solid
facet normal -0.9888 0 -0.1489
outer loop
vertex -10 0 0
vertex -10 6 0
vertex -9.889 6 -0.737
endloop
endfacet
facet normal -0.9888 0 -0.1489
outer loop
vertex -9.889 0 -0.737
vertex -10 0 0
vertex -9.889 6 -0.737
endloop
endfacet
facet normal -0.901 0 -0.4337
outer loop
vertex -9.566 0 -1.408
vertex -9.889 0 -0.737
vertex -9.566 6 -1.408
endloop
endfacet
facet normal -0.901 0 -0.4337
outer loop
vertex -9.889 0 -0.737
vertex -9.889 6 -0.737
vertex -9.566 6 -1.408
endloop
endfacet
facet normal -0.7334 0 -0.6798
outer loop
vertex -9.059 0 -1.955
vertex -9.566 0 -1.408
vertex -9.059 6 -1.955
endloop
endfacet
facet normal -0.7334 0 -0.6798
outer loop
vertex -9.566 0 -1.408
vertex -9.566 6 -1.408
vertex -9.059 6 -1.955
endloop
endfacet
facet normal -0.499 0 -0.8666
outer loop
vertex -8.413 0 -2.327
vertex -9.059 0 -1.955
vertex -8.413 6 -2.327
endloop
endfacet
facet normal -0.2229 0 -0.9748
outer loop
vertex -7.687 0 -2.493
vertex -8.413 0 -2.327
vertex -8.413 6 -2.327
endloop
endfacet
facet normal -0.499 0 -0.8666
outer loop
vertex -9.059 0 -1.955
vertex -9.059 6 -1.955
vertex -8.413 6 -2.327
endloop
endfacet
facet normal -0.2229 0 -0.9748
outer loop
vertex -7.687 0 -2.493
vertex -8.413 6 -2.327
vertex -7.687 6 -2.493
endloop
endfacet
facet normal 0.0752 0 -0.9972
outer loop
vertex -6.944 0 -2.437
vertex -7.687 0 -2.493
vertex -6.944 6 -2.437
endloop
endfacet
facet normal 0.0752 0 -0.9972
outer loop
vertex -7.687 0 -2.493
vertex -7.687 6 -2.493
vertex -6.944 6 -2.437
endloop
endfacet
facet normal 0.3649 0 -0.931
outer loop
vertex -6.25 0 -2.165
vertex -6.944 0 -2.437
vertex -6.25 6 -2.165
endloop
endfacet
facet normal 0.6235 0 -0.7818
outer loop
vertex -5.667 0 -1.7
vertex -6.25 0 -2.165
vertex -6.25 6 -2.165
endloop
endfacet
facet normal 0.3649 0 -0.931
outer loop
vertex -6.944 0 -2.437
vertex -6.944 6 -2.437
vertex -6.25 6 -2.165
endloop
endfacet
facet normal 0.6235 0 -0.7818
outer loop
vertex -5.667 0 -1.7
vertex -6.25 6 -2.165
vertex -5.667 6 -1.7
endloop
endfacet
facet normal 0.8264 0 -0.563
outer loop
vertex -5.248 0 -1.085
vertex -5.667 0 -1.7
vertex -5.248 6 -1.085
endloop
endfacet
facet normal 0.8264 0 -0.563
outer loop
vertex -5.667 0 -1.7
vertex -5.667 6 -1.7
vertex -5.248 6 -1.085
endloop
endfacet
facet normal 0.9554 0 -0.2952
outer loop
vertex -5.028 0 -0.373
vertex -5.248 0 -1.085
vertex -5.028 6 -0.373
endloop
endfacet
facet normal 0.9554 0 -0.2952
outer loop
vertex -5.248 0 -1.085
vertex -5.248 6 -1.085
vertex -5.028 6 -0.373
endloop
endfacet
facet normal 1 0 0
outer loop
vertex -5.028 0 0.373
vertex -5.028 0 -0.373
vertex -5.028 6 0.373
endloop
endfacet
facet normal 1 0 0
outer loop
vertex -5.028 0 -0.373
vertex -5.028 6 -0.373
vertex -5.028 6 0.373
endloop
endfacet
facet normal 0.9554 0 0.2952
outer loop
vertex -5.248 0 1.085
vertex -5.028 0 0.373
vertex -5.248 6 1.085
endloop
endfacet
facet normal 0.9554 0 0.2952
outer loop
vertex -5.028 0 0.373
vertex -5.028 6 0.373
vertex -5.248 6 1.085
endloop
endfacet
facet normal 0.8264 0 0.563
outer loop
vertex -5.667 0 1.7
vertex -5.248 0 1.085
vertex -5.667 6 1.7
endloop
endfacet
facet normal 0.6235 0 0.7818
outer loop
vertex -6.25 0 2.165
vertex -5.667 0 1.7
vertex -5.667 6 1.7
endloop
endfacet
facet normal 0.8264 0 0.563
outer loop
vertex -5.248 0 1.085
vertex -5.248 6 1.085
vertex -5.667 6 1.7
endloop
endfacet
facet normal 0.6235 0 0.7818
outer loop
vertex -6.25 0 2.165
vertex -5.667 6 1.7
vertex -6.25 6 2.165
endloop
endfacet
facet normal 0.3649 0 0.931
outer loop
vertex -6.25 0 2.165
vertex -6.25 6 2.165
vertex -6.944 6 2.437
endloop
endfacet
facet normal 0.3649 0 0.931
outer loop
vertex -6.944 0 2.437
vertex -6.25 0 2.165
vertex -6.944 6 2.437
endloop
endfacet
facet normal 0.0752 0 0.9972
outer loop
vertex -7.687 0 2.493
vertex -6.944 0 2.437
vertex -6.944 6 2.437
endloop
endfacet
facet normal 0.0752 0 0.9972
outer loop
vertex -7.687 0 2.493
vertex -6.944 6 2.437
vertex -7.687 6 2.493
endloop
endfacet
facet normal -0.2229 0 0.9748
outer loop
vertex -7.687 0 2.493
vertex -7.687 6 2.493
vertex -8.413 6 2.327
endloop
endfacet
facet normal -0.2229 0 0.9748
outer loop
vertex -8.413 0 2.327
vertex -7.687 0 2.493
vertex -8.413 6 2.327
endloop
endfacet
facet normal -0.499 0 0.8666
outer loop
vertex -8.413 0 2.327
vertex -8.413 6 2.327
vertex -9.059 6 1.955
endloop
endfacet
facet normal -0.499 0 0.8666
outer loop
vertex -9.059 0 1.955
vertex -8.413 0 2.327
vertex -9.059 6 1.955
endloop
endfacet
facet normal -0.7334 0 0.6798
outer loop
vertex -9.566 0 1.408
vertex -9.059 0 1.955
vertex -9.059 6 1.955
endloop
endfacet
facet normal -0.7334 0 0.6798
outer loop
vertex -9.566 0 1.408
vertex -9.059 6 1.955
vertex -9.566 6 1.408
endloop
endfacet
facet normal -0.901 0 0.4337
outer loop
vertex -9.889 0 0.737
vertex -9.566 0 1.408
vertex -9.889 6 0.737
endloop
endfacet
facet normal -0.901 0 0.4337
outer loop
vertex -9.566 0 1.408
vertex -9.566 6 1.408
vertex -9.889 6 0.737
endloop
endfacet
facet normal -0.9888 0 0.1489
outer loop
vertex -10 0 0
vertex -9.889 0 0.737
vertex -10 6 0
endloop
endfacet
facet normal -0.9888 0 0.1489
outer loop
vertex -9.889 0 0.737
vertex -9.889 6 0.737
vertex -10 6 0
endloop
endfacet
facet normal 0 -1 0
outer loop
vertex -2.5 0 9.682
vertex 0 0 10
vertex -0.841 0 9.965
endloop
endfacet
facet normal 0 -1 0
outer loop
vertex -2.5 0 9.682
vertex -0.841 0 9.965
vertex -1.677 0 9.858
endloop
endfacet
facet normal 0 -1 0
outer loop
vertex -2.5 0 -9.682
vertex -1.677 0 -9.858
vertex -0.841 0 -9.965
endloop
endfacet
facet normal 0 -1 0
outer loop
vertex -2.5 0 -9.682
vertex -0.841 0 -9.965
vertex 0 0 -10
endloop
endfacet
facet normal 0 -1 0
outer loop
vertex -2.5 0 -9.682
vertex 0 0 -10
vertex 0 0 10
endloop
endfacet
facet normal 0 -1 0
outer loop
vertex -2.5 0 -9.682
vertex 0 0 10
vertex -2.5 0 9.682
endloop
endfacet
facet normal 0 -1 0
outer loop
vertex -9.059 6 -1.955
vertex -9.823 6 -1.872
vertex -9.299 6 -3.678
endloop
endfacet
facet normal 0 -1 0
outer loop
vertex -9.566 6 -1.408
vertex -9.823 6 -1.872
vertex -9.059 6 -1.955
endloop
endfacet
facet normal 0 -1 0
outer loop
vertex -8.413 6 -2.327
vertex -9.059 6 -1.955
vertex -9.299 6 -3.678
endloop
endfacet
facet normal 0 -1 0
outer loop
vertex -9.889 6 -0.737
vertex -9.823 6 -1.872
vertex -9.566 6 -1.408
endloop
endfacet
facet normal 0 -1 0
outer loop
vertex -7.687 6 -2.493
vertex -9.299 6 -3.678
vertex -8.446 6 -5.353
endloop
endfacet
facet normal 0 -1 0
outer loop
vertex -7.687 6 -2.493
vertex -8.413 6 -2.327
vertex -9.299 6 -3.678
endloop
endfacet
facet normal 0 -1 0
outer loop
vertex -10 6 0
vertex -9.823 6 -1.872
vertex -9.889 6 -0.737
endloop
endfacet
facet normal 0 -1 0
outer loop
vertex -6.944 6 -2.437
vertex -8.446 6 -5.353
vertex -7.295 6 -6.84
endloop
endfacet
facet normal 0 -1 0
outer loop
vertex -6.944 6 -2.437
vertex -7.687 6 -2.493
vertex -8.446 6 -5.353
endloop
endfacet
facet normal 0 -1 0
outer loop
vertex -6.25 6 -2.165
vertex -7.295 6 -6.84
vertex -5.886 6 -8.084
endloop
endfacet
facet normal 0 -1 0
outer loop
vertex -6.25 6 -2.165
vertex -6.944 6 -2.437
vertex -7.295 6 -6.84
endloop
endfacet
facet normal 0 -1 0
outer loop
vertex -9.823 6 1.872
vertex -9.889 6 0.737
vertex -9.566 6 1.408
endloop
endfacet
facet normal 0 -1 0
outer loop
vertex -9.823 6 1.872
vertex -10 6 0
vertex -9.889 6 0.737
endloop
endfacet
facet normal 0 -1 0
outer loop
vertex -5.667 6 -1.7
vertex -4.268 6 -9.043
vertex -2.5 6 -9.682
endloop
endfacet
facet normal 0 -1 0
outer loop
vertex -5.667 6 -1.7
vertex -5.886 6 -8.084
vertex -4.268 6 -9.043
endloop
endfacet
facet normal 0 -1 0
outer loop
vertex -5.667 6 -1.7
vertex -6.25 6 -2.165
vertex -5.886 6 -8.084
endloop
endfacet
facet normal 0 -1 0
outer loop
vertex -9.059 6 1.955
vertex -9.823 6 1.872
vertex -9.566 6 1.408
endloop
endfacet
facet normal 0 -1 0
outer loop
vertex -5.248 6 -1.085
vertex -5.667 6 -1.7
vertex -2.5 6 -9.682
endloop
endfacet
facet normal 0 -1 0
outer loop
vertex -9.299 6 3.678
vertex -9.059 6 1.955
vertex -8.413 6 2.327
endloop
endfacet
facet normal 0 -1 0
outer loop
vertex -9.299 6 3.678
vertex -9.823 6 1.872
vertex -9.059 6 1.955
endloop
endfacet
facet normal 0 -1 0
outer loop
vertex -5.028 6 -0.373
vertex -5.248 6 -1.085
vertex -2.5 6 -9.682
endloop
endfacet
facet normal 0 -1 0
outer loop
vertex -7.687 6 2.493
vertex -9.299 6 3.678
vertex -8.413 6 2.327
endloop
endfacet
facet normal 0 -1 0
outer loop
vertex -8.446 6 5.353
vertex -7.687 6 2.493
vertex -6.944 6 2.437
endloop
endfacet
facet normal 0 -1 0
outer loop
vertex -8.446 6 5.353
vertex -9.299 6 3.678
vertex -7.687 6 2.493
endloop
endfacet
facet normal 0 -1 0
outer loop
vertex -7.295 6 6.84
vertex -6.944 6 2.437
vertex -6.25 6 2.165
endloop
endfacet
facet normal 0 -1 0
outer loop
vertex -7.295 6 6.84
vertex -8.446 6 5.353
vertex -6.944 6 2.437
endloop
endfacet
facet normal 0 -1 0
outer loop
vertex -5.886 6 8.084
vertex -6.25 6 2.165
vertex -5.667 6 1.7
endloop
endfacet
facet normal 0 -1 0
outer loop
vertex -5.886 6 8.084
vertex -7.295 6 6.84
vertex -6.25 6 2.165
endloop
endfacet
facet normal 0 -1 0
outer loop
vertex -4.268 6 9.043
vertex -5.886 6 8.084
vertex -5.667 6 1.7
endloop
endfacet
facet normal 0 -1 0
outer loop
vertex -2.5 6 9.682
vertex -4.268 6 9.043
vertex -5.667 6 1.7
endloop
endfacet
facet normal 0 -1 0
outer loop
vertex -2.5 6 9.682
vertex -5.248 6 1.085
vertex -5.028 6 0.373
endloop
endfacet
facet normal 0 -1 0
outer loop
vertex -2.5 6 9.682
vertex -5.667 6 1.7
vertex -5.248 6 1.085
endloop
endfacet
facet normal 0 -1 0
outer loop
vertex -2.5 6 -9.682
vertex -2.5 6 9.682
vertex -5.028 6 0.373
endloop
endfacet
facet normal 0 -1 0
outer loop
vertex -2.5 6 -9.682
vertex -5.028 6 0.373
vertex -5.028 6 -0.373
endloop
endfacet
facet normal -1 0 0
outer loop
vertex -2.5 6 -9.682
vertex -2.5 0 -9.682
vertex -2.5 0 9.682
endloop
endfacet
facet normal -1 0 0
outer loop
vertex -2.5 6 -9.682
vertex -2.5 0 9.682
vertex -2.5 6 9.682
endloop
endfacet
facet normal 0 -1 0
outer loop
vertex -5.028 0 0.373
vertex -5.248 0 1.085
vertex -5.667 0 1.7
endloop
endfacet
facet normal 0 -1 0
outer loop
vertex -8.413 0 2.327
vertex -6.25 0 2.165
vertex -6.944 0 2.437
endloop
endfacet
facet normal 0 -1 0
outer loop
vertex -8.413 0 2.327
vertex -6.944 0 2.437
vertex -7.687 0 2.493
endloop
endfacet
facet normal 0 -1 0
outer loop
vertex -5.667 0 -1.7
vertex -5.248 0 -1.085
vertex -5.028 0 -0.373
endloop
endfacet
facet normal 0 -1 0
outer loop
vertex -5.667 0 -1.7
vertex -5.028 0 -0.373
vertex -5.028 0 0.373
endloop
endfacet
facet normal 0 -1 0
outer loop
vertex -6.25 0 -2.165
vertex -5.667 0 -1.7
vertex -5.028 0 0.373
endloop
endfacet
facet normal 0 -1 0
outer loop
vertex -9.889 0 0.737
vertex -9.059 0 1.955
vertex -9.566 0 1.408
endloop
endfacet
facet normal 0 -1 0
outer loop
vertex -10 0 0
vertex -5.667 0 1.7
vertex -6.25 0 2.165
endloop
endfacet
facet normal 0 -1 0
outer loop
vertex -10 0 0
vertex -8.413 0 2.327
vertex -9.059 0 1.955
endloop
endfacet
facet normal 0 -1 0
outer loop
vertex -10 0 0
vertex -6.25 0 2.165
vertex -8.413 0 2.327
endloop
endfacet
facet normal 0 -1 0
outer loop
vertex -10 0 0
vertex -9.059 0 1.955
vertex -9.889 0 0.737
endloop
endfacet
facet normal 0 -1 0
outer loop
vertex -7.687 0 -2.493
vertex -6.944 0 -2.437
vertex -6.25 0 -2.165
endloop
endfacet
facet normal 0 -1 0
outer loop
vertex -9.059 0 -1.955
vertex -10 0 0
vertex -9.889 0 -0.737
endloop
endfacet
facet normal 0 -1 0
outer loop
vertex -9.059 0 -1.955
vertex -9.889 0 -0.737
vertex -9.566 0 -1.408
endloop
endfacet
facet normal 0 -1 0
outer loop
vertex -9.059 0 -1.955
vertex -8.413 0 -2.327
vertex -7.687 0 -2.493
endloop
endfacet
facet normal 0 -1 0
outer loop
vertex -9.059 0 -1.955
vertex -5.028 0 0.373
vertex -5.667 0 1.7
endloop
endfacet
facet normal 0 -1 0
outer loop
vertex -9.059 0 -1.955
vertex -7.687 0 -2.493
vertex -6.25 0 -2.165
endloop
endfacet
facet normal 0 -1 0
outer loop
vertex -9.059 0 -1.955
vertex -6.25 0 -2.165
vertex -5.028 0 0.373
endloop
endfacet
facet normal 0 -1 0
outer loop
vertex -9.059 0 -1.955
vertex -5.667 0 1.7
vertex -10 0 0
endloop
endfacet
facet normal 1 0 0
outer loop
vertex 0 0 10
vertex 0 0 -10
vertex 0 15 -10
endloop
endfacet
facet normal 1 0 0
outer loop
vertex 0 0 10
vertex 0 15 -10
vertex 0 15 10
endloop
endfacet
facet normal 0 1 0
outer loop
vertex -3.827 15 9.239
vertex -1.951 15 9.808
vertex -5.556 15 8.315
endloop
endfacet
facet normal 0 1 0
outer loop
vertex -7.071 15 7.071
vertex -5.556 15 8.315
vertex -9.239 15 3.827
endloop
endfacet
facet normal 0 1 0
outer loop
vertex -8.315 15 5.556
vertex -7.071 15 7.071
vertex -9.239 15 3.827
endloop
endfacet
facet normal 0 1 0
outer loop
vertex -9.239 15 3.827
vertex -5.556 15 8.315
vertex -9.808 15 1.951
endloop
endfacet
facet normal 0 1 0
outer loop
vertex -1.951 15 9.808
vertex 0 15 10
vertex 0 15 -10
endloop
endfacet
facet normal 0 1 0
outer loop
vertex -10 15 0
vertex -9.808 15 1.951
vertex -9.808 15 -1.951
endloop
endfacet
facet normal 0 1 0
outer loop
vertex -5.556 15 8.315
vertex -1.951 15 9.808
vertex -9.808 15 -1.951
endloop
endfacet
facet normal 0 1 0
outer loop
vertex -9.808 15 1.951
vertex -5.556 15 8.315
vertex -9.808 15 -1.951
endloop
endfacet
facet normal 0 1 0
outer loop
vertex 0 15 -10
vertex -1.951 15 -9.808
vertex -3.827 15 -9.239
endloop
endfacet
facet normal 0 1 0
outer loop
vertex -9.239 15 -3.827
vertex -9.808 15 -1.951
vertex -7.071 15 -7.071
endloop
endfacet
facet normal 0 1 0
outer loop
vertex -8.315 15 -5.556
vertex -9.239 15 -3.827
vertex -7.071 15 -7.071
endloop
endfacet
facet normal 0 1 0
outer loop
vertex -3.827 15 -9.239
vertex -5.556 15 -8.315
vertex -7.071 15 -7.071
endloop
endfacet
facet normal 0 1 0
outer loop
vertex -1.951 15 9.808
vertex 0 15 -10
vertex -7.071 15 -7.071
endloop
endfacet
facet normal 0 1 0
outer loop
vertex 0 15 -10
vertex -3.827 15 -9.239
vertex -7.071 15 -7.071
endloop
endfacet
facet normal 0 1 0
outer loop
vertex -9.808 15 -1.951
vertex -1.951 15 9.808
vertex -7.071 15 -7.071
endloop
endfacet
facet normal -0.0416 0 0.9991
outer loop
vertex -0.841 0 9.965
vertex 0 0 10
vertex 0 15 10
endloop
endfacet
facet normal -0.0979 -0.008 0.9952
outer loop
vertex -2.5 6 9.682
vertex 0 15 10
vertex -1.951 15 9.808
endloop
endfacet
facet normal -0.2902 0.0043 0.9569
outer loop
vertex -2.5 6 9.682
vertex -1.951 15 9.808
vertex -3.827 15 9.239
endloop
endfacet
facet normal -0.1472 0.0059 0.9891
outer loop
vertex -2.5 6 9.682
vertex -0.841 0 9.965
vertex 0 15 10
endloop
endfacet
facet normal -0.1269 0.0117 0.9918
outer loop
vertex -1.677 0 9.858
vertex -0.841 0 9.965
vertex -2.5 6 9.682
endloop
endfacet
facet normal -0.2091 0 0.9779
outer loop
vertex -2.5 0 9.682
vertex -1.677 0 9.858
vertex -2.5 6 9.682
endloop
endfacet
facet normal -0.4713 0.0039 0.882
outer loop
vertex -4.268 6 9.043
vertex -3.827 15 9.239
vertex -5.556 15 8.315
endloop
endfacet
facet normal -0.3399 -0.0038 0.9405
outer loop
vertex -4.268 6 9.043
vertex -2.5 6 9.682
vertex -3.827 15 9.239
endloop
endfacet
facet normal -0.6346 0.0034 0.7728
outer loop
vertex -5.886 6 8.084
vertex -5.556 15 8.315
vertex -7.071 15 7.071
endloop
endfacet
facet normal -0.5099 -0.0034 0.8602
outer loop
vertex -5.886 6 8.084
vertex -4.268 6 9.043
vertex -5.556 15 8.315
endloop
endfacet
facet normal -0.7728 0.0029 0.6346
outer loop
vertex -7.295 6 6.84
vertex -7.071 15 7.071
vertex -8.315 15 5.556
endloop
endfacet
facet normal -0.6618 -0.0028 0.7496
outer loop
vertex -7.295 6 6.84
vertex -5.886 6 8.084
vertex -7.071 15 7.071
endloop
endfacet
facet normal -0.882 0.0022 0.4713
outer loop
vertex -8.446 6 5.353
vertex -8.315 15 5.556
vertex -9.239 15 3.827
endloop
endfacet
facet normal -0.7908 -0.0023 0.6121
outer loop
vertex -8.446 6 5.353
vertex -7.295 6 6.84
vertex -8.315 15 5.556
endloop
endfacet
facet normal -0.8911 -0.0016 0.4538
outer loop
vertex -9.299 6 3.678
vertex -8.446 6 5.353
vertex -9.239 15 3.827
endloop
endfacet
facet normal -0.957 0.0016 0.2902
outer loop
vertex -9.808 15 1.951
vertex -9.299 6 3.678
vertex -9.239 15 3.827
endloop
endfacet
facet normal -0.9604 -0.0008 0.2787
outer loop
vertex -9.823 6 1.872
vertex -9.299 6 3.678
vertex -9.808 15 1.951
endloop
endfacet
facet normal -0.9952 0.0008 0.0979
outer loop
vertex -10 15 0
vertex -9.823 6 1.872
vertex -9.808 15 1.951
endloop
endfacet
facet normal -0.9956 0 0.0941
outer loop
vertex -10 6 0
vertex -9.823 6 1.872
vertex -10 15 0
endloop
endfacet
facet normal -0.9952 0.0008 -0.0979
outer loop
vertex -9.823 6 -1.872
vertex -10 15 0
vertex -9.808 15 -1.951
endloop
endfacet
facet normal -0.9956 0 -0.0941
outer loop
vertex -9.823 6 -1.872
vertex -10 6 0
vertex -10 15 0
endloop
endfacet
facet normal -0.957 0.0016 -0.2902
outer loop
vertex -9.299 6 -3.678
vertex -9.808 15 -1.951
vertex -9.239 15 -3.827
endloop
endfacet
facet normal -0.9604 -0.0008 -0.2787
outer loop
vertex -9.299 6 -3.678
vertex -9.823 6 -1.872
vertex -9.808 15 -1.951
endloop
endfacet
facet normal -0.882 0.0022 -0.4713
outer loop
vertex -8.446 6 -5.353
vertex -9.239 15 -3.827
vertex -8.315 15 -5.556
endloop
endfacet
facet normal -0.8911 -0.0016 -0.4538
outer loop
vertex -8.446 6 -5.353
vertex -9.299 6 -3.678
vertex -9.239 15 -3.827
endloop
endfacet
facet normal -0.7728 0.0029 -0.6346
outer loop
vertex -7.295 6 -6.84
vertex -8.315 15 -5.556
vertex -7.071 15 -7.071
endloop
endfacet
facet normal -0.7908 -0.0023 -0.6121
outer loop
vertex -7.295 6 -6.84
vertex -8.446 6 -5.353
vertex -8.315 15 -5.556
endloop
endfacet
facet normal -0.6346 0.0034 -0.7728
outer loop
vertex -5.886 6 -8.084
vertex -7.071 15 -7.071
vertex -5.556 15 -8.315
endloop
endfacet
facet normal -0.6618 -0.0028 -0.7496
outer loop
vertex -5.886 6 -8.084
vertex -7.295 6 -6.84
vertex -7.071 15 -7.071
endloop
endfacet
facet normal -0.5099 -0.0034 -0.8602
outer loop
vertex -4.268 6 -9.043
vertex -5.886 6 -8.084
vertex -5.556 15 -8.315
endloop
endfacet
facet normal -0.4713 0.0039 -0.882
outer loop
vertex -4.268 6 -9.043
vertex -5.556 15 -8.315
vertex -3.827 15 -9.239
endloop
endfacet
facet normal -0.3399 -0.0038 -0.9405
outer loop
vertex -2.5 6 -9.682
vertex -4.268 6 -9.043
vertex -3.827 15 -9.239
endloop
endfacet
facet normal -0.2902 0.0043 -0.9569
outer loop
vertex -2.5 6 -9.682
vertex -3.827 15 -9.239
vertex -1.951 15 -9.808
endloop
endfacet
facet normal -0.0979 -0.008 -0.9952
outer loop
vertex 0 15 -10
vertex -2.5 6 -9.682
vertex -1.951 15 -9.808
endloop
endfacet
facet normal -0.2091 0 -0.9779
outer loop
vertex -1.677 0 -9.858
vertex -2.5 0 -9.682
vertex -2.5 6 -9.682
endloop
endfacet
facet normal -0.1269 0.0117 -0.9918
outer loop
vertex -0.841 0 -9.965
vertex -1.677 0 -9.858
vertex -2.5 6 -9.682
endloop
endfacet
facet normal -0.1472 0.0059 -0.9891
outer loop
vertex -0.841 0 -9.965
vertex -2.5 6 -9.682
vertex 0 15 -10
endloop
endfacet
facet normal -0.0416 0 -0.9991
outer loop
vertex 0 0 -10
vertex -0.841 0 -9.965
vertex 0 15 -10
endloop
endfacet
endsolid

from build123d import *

# Parameters (mm, degrees)
SALIENTE_EXTRUIR1_DEPTH = 15
CROQUIS2_W              = 7.5
CROQUIS2_H              = 6
CORTAR_EXTRUIR2_DEPTH   = 27.925824036
CROQUIS4_R              = 2.5
SALIENTE_EXTRUIR2_DEPTH = 6


with BuildPart() as part:
    # Croquis1 → Saliente-Extruir1 (new body)
    with BuildSketch(Plane(origin=(0, 0, 0), x_dir=(1, 0, 0), z_dir=(0, 1, 0))):
        with BuildLine():
            Line((0, 10), (0, -10))
            ThreePointArc((0, -10), (-10, 0), (0, 10))
        make_face()
    extrude(amount=SALIENTE_EXTRUIR1_DEPTH)

    # Croquis2 → Cortar-Extruir2 (cut, through all)
    with BuildSketch(Plane.XY.offset(10)):
        with Locations((-6.25, 3)):
            Rectangle(CROQUIS2_W, CROQUIS2_H)
    extrude(amount=-CORTAR_EXTRUIR2_DEPTH, mode=Mode.SUBTRACT)

    # Croquis4 → Saliente-Extruir2 (add)
    with BuildSketch(Plane.XZ.offset(-6)):
        with Locations(Location((-7.5, 0, 0), (0, 0, 179.999408267))):
            Circle(CROQUIS4_R)
    extrude(amount=SALIENTE_EXTRUIR2_DEPTH)


solid = part.part
